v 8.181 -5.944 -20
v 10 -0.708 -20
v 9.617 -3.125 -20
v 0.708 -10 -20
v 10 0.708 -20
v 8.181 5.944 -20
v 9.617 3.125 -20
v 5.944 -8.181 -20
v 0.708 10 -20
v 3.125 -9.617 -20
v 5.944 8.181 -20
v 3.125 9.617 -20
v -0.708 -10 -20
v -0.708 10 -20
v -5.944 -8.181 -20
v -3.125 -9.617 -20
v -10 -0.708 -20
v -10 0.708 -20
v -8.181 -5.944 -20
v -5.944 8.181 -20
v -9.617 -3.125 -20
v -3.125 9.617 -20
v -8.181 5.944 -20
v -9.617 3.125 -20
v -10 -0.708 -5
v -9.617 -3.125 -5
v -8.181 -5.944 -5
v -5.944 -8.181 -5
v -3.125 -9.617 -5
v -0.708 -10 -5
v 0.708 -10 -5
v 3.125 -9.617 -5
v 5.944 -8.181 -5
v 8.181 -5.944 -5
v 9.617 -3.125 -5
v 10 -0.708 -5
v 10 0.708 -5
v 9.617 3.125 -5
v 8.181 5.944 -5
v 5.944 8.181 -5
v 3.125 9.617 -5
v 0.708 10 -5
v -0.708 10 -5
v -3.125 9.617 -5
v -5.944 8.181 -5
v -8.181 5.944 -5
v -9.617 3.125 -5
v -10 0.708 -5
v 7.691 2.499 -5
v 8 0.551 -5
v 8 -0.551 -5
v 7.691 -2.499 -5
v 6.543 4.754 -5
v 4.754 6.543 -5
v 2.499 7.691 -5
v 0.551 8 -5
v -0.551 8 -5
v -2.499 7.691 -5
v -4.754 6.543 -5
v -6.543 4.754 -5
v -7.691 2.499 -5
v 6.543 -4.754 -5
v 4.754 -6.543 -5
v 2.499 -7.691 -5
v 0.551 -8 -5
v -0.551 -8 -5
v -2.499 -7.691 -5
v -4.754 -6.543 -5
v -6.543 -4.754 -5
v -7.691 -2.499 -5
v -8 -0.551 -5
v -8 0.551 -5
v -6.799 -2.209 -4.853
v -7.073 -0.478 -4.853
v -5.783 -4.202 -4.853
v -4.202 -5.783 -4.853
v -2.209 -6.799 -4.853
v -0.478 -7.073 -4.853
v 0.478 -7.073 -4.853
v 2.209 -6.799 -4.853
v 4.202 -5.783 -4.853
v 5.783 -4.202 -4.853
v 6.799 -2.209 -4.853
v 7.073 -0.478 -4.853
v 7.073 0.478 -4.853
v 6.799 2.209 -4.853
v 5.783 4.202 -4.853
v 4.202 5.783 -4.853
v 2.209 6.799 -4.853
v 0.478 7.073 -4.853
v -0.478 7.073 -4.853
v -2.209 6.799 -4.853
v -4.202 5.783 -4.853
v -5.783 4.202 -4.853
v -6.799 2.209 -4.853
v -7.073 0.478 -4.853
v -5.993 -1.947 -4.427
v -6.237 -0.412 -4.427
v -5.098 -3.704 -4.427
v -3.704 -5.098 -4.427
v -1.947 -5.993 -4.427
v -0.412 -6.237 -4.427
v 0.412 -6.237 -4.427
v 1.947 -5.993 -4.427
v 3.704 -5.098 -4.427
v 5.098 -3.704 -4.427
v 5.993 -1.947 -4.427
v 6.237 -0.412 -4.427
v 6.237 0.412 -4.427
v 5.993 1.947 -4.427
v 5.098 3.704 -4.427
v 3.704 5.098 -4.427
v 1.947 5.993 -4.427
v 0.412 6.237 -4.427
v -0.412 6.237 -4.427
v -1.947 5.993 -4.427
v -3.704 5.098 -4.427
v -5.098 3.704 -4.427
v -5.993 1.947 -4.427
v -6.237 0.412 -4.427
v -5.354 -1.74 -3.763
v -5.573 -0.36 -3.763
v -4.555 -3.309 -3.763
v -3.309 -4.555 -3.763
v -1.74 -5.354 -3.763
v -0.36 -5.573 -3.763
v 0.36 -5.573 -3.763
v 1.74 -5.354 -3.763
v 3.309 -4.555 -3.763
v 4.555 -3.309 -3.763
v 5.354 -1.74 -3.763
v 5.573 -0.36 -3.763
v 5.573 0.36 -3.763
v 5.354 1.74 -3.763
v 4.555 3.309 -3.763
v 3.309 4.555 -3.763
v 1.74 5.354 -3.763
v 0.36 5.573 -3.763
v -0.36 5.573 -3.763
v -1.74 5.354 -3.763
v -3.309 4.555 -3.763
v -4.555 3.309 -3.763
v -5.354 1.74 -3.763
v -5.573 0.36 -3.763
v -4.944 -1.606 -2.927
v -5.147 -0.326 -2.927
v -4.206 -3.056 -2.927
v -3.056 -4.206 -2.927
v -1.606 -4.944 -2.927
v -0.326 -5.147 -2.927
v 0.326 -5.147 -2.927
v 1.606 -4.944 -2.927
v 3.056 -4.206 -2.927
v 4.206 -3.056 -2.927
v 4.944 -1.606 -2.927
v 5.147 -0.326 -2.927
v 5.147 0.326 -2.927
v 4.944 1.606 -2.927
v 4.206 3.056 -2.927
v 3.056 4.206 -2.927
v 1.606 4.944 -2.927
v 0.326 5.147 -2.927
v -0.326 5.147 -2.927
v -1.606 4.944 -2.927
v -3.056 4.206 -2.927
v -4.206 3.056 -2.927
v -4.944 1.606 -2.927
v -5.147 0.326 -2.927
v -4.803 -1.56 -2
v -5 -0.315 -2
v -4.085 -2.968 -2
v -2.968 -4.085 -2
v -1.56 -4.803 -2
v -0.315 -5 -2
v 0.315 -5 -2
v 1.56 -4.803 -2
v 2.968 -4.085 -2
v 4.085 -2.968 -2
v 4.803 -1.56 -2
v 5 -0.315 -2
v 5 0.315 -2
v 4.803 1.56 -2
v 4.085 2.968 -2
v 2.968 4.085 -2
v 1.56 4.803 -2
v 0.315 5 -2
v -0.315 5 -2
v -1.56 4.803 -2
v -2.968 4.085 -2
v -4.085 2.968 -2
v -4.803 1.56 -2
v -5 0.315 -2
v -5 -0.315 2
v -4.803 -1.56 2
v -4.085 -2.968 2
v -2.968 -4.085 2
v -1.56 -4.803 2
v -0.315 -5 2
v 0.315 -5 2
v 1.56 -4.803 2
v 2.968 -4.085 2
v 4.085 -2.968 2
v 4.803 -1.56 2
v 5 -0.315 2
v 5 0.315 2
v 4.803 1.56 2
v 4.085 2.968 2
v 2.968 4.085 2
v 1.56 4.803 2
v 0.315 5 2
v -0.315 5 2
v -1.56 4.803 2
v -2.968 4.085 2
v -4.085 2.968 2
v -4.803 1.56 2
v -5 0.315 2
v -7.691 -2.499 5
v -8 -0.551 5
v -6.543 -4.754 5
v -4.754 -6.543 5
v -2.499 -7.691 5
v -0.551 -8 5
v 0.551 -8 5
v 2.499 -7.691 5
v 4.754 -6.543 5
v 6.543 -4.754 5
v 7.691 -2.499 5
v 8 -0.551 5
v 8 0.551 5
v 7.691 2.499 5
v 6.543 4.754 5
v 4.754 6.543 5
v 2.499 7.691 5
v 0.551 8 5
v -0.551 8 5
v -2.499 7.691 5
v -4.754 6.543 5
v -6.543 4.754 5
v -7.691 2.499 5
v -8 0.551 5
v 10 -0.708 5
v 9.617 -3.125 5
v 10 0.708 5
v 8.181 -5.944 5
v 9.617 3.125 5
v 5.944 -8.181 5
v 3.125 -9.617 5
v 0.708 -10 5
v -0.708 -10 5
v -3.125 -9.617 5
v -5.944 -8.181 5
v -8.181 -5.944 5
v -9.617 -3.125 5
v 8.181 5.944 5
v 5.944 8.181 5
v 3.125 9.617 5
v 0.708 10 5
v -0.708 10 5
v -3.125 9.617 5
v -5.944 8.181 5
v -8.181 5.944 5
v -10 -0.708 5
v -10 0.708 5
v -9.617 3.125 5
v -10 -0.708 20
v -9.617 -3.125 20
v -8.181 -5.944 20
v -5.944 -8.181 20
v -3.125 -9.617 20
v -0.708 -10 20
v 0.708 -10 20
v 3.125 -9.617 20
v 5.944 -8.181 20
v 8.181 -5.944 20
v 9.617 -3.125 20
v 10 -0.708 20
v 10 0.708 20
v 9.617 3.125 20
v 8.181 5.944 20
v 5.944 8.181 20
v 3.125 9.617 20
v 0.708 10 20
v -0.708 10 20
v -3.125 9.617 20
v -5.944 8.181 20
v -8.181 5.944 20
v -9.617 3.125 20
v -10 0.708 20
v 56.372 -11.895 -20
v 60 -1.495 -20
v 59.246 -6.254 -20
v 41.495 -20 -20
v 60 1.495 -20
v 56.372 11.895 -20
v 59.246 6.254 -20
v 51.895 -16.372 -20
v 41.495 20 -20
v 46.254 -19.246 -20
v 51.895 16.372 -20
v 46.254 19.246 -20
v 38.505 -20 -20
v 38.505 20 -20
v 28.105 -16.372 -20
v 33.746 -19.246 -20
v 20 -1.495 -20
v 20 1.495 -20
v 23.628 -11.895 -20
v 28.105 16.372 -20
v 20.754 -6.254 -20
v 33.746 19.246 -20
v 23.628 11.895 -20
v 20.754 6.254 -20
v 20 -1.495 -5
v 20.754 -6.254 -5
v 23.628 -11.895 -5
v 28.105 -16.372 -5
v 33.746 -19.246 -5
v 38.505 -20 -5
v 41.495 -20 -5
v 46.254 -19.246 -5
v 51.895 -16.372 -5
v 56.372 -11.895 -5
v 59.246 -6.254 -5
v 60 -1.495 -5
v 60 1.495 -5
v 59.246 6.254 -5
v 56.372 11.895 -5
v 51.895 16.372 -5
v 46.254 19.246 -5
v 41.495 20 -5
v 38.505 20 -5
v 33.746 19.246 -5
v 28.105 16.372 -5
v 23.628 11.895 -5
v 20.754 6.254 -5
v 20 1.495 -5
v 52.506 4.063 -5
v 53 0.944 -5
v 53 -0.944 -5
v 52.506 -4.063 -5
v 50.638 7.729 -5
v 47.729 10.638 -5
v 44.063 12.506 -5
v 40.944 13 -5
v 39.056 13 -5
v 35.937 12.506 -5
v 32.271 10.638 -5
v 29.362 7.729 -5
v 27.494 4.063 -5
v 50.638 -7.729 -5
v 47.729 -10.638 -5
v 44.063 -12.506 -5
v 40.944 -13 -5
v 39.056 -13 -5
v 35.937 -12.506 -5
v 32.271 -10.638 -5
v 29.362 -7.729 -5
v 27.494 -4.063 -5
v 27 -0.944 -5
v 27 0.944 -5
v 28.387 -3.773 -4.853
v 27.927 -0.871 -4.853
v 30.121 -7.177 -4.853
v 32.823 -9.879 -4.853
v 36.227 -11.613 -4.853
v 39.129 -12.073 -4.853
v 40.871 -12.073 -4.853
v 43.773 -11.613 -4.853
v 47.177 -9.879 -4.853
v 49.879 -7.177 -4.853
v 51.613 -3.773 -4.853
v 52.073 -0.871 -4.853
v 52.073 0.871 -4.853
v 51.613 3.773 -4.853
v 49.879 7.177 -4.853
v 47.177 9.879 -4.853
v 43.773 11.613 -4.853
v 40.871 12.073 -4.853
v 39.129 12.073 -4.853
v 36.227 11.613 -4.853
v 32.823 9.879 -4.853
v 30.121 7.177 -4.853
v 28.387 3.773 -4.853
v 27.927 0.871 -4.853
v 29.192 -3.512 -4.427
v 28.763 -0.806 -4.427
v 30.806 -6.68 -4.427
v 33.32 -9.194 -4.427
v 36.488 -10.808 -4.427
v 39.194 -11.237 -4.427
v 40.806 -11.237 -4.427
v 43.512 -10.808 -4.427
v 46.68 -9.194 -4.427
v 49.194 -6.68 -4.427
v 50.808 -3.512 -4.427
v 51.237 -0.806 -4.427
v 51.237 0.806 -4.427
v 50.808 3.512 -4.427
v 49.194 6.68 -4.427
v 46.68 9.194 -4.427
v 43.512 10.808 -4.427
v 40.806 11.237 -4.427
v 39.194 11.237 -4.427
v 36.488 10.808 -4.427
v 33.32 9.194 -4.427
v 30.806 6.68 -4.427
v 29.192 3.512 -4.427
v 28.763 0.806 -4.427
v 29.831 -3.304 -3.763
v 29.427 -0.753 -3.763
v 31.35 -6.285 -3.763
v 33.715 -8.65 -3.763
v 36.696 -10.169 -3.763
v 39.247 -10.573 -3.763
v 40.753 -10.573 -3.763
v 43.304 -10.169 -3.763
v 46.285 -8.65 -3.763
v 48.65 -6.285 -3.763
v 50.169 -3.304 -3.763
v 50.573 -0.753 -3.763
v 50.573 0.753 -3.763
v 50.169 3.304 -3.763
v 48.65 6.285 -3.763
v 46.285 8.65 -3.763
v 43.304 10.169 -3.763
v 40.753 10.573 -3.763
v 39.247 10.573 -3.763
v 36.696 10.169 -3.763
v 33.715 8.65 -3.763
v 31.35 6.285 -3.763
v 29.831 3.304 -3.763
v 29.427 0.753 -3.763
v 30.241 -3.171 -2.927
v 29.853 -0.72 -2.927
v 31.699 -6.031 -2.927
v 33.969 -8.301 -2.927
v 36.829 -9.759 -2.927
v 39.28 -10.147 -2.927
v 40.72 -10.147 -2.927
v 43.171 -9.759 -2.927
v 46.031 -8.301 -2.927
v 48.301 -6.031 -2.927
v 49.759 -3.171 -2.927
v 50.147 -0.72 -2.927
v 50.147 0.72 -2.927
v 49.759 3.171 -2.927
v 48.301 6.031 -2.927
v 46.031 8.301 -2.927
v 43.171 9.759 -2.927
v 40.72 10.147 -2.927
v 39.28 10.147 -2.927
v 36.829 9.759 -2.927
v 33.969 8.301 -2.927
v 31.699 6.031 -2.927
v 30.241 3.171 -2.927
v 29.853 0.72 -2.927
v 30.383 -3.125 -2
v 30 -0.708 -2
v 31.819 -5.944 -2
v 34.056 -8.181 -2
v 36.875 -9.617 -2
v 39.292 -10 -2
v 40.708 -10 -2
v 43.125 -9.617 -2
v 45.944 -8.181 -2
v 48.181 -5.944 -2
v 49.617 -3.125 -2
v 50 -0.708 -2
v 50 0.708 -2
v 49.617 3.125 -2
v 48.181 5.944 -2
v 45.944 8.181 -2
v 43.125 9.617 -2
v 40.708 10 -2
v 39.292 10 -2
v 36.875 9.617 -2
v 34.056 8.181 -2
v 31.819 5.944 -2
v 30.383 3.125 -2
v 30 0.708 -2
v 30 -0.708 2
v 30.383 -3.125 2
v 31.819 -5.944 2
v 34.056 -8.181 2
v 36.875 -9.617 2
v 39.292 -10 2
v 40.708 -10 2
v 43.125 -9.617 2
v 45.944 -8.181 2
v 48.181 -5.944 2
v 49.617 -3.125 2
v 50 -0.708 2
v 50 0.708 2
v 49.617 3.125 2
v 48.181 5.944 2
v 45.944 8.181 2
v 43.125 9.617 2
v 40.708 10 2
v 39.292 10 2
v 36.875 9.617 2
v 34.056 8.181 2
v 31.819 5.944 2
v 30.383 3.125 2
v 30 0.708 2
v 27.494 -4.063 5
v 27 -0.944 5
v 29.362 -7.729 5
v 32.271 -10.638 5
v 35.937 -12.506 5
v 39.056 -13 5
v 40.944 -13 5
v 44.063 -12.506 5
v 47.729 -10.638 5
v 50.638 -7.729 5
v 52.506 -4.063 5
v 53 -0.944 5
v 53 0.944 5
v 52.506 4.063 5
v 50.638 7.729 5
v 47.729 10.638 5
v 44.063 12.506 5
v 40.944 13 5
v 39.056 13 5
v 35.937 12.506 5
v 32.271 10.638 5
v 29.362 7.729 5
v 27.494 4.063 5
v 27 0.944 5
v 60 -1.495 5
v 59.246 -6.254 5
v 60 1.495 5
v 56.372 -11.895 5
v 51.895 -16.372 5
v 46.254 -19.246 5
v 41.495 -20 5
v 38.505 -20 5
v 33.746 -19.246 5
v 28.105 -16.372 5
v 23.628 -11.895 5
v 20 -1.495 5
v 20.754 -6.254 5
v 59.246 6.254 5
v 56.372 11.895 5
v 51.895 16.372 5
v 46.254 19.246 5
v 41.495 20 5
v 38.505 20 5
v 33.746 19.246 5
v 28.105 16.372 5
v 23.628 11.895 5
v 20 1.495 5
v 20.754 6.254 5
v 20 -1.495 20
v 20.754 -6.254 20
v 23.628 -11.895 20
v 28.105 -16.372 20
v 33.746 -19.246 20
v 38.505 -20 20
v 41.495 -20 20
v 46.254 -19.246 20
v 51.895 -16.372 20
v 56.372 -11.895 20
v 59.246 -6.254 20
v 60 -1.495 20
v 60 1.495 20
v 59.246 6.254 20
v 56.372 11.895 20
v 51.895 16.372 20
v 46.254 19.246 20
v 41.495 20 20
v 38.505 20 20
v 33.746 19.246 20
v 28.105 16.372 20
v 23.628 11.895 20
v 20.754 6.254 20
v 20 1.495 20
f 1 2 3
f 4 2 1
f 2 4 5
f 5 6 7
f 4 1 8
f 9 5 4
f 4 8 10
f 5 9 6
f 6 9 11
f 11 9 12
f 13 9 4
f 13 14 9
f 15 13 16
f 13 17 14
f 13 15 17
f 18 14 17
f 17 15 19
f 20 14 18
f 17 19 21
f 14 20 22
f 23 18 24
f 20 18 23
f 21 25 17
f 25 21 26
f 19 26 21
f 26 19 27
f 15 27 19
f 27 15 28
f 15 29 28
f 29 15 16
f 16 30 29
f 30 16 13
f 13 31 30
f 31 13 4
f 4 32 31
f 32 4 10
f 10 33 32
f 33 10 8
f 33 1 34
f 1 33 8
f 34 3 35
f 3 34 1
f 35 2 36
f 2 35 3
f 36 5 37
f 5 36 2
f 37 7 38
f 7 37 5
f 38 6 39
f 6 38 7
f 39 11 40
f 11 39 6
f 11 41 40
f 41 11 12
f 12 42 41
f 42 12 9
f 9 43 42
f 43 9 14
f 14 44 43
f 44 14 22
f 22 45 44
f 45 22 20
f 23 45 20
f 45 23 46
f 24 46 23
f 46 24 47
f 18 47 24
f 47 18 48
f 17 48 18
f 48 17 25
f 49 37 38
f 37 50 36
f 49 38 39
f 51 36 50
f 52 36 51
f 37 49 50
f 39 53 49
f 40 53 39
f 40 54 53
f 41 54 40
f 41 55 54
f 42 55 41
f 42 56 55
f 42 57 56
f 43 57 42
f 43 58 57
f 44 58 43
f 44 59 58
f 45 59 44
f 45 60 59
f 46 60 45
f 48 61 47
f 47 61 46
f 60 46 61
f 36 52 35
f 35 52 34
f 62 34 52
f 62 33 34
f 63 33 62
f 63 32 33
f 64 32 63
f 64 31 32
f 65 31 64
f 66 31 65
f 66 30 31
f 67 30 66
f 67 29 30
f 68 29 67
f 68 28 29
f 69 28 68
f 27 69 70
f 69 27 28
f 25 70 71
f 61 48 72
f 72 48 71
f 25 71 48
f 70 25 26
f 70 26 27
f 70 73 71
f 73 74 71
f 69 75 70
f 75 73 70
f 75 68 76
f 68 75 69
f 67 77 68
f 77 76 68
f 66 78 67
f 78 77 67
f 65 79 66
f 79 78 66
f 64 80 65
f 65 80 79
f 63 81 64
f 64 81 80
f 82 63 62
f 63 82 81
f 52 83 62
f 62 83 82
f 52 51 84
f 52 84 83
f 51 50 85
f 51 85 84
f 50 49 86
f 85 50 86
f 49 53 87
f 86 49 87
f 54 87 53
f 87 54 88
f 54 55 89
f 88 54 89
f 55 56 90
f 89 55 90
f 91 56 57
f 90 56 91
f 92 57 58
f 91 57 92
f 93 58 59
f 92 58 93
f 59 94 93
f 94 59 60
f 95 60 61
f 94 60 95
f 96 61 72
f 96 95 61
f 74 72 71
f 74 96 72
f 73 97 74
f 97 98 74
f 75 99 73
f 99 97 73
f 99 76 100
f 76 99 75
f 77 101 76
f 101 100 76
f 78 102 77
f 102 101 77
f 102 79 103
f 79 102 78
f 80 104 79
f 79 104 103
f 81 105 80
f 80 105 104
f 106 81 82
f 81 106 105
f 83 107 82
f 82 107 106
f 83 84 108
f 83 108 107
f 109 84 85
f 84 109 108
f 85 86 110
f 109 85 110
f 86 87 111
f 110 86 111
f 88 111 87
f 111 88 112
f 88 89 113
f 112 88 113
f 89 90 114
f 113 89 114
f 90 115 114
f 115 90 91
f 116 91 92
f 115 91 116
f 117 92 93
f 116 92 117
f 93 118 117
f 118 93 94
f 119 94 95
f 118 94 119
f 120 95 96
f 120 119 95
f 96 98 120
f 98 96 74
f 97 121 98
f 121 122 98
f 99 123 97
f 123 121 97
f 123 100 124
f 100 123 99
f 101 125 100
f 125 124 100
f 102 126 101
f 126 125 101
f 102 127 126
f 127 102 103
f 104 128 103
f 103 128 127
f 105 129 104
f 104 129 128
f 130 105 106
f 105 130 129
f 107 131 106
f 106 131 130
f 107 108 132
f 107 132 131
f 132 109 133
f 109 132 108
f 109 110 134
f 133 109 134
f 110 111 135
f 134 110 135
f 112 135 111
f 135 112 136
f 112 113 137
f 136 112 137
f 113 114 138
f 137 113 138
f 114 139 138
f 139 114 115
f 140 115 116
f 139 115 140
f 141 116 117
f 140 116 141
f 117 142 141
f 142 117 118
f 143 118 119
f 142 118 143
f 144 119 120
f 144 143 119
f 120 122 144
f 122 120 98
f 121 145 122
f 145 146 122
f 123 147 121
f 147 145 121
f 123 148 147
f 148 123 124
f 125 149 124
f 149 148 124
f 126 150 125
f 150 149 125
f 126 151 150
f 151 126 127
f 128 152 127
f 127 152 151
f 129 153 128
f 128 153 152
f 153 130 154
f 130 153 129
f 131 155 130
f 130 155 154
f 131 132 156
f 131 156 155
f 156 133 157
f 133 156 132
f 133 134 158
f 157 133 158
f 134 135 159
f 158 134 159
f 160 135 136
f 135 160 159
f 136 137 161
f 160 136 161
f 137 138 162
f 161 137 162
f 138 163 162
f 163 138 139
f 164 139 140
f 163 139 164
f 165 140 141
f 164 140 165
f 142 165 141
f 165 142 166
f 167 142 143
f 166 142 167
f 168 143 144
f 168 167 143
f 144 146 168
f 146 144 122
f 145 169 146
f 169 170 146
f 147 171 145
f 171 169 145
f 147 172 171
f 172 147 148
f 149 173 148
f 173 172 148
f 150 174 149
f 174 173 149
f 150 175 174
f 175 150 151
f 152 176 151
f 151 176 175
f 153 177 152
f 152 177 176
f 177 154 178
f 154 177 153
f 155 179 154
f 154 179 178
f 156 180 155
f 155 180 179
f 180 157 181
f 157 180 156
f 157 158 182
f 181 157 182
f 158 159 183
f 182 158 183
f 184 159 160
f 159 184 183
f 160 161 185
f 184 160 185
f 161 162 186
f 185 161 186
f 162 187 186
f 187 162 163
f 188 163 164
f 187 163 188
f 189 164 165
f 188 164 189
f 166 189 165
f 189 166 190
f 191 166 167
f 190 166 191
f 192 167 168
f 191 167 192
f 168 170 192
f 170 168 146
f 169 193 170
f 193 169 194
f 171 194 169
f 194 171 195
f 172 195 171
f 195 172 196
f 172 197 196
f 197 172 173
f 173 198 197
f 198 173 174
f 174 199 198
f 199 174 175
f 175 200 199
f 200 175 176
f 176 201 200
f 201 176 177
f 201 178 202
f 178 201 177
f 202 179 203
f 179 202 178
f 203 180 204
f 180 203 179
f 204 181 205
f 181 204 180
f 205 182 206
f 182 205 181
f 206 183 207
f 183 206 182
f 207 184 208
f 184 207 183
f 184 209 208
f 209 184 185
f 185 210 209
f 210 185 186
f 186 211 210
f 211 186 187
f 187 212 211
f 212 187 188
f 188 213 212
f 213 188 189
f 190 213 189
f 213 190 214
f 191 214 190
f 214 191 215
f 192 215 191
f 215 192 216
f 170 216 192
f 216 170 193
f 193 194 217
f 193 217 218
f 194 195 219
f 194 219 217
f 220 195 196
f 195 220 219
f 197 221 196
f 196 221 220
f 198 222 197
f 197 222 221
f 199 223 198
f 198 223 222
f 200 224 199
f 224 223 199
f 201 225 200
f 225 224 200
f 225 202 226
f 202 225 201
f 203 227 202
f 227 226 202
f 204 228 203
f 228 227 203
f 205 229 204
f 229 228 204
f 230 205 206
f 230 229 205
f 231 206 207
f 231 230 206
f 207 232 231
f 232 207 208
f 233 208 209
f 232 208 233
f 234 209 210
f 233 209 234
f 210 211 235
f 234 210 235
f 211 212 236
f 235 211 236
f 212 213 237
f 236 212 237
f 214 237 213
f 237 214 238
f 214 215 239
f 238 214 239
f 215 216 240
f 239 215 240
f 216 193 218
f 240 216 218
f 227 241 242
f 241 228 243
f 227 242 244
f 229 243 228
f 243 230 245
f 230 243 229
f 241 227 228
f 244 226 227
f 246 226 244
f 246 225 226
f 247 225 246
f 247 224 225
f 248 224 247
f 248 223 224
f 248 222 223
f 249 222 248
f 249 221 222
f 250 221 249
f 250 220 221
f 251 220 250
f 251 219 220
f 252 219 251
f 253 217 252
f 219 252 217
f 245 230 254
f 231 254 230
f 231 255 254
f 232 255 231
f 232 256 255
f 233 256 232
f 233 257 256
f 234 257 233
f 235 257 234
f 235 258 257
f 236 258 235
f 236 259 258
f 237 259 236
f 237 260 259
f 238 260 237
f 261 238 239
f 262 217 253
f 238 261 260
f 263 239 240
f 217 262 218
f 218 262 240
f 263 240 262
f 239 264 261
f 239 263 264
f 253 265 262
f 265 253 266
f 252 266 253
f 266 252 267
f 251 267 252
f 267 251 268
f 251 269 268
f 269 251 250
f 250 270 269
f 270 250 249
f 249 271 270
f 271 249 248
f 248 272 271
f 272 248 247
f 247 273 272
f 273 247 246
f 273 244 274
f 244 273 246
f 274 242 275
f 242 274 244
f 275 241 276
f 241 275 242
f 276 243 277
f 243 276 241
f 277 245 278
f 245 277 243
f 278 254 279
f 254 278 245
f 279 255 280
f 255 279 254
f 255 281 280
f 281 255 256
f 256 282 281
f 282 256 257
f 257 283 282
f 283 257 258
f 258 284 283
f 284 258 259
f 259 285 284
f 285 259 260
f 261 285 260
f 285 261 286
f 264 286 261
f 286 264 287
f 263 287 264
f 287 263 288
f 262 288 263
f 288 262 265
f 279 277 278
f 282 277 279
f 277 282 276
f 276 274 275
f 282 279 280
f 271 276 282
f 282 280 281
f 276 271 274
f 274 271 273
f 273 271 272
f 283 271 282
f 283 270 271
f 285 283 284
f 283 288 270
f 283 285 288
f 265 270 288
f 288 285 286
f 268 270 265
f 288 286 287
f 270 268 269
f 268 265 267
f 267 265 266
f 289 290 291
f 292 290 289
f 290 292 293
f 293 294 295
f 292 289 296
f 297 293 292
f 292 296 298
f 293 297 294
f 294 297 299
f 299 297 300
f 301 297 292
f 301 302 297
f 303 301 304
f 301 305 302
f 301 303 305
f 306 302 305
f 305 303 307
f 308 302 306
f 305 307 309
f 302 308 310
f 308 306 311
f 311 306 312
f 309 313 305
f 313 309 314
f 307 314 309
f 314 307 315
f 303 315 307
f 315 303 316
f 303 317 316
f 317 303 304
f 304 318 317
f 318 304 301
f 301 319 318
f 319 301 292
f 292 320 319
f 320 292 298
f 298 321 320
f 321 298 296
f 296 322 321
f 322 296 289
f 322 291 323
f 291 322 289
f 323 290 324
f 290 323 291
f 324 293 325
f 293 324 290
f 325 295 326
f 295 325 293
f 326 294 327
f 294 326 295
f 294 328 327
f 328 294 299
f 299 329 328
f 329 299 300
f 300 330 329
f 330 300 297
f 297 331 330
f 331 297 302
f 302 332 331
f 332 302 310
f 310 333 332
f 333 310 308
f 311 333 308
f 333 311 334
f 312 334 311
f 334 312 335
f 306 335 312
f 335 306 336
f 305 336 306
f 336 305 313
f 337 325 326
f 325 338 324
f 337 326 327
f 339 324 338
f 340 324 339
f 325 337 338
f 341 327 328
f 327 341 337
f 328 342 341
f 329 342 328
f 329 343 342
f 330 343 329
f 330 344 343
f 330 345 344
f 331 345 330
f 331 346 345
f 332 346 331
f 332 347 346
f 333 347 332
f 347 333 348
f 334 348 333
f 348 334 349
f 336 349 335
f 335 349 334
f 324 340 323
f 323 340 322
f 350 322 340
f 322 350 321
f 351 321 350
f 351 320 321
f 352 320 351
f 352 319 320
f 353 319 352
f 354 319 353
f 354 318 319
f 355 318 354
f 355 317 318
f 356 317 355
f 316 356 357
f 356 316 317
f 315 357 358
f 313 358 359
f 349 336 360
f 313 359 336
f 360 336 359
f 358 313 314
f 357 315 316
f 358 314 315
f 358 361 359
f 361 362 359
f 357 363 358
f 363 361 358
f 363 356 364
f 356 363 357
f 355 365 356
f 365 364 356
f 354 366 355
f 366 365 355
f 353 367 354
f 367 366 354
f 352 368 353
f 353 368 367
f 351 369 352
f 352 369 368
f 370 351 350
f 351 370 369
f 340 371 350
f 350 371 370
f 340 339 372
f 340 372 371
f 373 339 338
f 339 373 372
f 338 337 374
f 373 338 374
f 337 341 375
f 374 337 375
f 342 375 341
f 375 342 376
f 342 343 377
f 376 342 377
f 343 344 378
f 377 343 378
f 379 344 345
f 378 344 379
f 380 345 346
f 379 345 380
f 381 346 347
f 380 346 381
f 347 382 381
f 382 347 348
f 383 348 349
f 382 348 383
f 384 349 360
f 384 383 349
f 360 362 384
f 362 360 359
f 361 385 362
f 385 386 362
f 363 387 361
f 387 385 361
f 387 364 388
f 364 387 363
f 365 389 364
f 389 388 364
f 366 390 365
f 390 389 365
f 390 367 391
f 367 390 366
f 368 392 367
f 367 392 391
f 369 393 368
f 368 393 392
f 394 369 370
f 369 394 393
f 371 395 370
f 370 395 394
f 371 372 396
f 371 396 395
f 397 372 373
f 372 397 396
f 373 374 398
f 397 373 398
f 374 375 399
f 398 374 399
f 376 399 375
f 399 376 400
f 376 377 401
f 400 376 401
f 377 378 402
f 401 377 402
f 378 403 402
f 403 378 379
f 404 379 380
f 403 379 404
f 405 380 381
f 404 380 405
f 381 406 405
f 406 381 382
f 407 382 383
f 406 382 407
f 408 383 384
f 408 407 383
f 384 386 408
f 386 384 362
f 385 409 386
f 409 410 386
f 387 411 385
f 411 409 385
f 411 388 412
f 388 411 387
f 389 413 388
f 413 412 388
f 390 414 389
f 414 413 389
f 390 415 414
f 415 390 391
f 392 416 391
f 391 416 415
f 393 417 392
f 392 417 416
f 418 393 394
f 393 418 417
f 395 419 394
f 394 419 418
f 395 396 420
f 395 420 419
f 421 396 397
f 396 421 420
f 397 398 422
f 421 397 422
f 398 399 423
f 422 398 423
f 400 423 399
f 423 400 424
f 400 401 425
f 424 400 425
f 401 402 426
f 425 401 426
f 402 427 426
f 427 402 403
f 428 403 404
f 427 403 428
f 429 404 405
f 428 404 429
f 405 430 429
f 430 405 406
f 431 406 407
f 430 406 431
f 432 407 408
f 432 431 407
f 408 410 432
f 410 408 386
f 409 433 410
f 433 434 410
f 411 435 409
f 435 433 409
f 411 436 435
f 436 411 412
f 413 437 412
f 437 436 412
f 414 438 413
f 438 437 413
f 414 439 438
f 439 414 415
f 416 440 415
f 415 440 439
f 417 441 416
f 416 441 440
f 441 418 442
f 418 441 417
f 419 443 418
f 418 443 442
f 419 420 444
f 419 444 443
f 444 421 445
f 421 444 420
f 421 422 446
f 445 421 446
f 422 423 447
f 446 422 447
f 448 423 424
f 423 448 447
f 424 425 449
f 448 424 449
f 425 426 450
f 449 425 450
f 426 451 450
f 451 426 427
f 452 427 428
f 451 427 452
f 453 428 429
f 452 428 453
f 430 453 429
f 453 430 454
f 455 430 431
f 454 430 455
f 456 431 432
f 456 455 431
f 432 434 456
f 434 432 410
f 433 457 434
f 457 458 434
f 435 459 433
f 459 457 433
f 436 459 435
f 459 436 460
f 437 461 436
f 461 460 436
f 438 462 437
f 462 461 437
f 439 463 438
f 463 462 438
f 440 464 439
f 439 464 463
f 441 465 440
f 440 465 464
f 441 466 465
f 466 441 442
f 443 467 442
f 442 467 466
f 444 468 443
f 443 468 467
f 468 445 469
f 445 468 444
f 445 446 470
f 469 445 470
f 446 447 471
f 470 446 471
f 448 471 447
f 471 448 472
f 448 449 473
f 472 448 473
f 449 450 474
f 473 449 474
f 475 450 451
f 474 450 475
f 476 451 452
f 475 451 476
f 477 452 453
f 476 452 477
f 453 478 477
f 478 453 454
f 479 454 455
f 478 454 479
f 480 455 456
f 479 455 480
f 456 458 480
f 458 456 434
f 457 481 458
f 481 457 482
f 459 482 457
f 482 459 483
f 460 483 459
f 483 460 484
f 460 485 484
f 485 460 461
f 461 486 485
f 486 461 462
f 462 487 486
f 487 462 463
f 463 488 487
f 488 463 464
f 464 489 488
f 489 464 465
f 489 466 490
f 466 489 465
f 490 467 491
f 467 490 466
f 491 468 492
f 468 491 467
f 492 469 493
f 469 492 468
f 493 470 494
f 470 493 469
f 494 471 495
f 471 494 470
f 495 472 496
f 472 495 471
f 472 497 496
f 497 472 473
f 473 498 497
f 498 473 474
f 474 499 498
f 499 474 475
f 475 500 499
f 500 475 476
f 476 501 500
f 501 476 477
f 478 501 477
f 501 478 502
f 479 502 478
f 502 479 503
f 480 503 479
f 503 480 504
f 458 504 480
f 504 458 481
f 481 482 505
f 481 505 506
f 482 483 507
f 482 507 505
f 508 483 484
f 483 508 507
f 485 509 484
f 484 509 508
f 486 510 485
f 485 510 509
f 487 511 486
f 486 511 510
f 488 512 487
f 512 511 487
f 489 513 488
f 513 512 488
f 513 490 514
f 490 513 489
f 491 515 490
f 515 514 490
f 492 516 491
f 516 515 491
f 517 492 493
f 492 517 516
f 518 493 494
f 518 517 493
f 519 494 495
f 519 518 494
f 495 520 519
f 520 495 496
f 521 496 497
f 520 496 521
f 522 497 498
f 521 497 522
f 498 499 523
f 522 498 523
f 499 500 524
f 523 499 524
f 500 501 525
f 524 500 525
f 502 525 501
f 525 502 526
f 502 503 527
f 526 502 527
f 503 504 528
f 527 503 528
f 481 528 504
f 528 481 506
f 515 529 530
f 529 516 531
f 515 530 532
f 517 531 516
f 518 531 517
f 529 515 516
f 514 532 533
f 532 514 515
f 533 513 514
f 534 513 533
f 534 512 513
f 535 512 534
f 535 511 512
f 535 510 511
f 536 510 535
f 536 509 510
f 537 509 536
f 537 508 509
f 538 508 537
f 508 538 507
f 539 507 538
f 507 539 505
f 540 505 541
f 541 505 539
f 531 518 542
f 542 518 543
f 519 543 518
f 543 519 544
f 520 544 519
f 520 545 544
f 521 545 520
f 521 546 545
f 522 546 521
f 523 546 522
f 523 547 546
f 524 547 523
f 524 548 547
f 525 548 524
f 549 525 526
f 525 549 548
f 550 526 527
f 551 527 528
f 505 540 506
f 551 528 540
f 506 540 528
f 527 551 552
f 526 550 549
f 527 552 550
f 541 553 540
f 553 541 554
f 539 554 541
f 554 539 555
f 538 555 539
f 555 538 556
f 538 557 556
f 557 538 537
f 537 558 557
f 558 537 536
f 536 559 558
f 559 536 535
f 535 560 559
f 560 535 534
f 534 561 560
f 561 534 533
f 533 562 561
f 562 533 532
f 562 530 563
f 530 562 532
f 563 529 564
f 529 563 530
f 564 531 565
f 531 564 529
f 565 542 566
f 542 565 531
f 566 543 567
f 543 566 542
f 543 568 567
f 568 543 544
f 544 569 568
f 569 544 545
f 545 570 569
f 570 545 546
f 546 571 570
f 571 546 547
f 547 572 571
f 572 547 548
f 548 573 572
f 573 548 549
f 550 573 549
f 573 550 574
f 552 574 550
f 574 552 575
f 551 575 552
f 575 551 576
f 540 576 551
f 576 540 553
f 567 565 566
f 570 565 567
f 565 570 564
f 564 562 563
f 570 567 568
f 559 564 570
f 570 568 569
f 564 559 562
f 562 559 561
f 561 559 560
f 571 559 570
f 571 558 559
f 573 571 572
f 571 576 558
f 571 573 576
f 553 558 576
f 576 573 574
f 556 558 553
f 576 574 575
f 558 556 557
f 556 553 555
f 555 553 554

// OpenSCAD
// file: ../lib/TOGComplexLib1.scad
function tcplx1_multiply(a, b) =
	[a[0]*b[0] - a[1]*b[1], a[0]*b[1] + a[1]*b[0]];
function tcplx1_divide(a, b) =
	let(bot = (b[0]*b[0] + b[1]*b[1]))
	[
		(a[0]*b[0] + a[1]*b[1])/bot,
		(a[1]*b[0] - a[0]*b[1])/bot
	];

assert([-11,23] == tcplx1_multiply([3,2], [1,7]));

assert([-1,3] == tcplx1_multiply([3,1], [0,1]));
assert([-1,3] == tcplx1_multiply([0,1], [3,1]));

echo(tcplx1_divide([-1,3], [3,1]));
assert([0,1] == tcplx1_divide([-1,3], [3,1]));

function tcplx1_normalize(vec) =
	let(veclen = sqrt(vec[0]*vec[0]+vec[1]*vec[1]))
	[vec[0] / veclen, vec[1] / veclen];

function tcplx1_relative_turnvec_vv(v0, v1) =
	tcplx1_divide(tcplx1_normalize(v1), tcplx1_normalize(v0));

function tcplx1_relative_turnvec_abc(p0, p1, p2) = tcplx1_relative_turnvec_vv(p1-p0, p2-p1);

// A 90-degree turn
assert([0,1] == tcplx1_relative_turnvec_abc([0,0], [1,0], [1,1]));
assert([0,1] == tcplx1_relative_turnvec_abc([0,0], [0,1], [-1,1]));

// A 45-degree turn
assert(tcplx1_normalize([1,1]) == tcplx1_relative_turnvec_abc([0,0], [1,0], [ 2,1]));
assert(tcplx1_normalize([1,1]) == tcplx1_relative_turnvec_abc([0,0], [0,1], [-1,2]));


function tcplx1_relative_angle_abc(p0, p1, p2) =
	let(turnvec = tcplx1_relative_turnvec_abc(p0, p1, p2))
	atan2(turnvec[1], turnvec[0]);

assert(-135 == tcplx1_relative_angle_abc([0,0], [1,0], [0,-1]));
assert( -90 == tcplx1_relative_angle_abc([0,0], [1,0], [1,-1]));
assert(   0 == tcplx1_relative_angle_abc([0,0], [1,0], [2, 0]));
assert(  90 == tcplx1_relative_angle_abc([0,0], [1,0], [1, 1]));
assert( 135 == tcplx1_relative_angle_abc([0,0], [1,0], [0, 1]));

assert(  90 == tcplx1_relative_angle_abc([1,1], [3,3], [1, 5]));
// file: ../lib/TOGArrayLib1.scad
// TOGArrayLib1.5
// 
// Functions for working with arrays.
// 
// v1.1:
// - tal1_reduce assert(is_list(items)) to prevent infinite recursion
//   when given undefined or other non-list values
// v1.1.1:
// - Fix tal1_uniq_remap_v2 to return "list-remap-result" as the
//   first element of the returned list
// v1.2:
// - Add tal1_replace_at function
// v1.3:
// - tal1_is_vec_of, tal1_is_vec_of_num
// v1.4:
// - tal1_assert_for_each, for when you want to assert something
//   about each of a list of items and get nice failure messages
// v1.5:
// - Add tal1_duplicate_reversed function, which may be
//   handy when generating symmetrical polygons and stuff.

/**
 * Make a list with the contents of list `a`,
 * but starting at offset `off`, replaced by the contents of list `b`.
 * len(result) = max(len(a), off+len(b))
 */
function tal1_replace_at(a, off, b, default_value=undef, default_value_function=undef) =
	assert(is_list(a))
	assert(is_list(b))
	let( _dvf = !is_undef(default_value_function) ? default_value_function : function(i) default_value )
[
	for( i=[0:1:min(off,len(a))-1] ) a[i],
	for( i=[len(a):1:off-1] ) _dvf(i),
	for( i=[off:1:off+len(b)-1] ) b[i-off],
	for( i=[off+len(b):1:len(a)-1] ) a[i],
];

// Simplest case
assert([] == tal1_replace_at([], 0, []));
// Second simplest cases
assert(["foo"] == tal1_replace_at(["foo"], 0, []));
assert(["foo"] == tal1_replace_at([], 0, ["foo"]));
// Replace one item
assert(["foo","quux","baz"] == tal1_replace_at(["foo","bar","baz"], 1, ["quux"]));
// Replace and extend
assert(["foo","quux","tuna","tina"] == tal1_replace_at(["foo","bar","baz"], 1, ["quux", "tuna", "tina"]));
// Add beyond end of `a`
assert(["foo","zzz","quux"] == tal1_replace_at(["foo"], 2, ["quux"], default_value="zzz"));
// Adding 'nothing' should still fill to that point with defaults
assert(["foo","zzz","zzz"] == tal1_replace_at(["foo"], 3, [], default_value="zzz"));


function tal1_reduce(start, items, func, offset=0) =
	assert(is_list(items))
	len(items) == offset ? start :
	tal1_reduce(func(start, items[offset]), items, func, offset+1);

function tal1_consecutive_duplicate_count(items) = tal1_reduce(
	[0, undef],
	items,
	function(z,item) [z[0] + (item == z[1] ? 1 : 0), item]
)[0];

assert(0 == tal1_consecutive_duplicate_count([]));
assert(0 == tal1_consecutive_duplicate_count([50]));
assert(1 == tal1_consecutive_duplicate_count([50,50]));
assert(0 == tal1_consecutive_duplicate_count([50,51,52,53]));
assert(1 == tal1_consecutive_duplicate_count([50,51,52,52]));
assert(3 == tal1_consecutive_duplicate_count([50,50,50,50]));

// Set test_size to arbirarily large values
// to ensure that OpenSCAD can handle heavy recursion
let(test_size=1000) assert(test_size/2 == tal1_consecutive_duplicate_count([for(i=[0:1:test_size-1]) floor(i/2)]));



function tal1_uniq_(items, off0, off1) =
	let(chunklen = off1-off0)
	chunklen == 0 ? [] :
	chunklen == 1 ? [items[off0]] :
	let(half=floor(chunklen/2))
	let(left  = tal1_uniq_(items, off0     , off0+half))
	let(right = tal1_uniq_(items, off0+half, off1     ))
	assert(len(left) > 0)
	assert(len(right) > 0)
	left[len(left)-1] == right[0] ? [each left, for(i=[1:1:len(right)-1]) right[i]] :
	[each left, each right];

/** Given a list of items, returns a new list with identical consecutive items merged */
function tal1_uniq(items) = tal1_uniq_(items, 0, len(items));

assert([] == tal1_uniq([]));
assert([123] == tal1_uniq([123]));
assert([55,0,1,2,3] == tal1_uniq([55,0,1,2,3]));
assert([55,0,1,2] == tal1_uniq([55,0,1,1,2]));
assert([55,0,1] == tal1_uniq([55,55,0,0,0,0,0,0,1,1,1,1]));
assert([55,0] == tal1_uniq([55,0,0,0,0,0,0,0]));



/**
 * Returns [new items, old index -> new index mapping].
 * No-op version.
 */
function tal1_uniq_remap_v1(items) =
	["list-remap-result", items, [for (vi=[0:1:len(items)-1]) vi]];

// [a, a, b, b, c, c]
//
// [a,    ...], []  -> [a],[0]
// [a, a, ...], [0] -> [a],[0,0]

assert([1,2,3] == [1,2,3]);

/**
 * Recursive version that will combine adjacent identical vertexes,
 * but will use the original items.
 */
function tal1_uniq_remap_v2(items, map=[]) =
	let(index = len(map))
	len(items) == index ? ["list-remap-result", items, map] :
	index == 0 ? tal1_uniq_remap_v2(items, [0]) :
	items[index] == items[map[index-1]] ? tal1_uniq_remap_v2(items, [for(vi=map) vi, map[index-1]]) :
	tal1_uniq_remap_v2(items, [for(vi=map) vi, index]);

assert(tal1_uniq_remap_v2([1,1,2,2,3,4]) == ["list-remap-result", [1,1,2,2,3,4], [0,0,2,2,4,5]]);


/**
 * Returns true if `vec` is a list of at least min_len items
 * and component_check(each item, even those beyond min_len) is true.
 */
function tal1_is_vec_of(vec, min_len=0, component_check=function(x) true) =
	assert(is_num(min_len) && min_len >= 0)
	assert(is_function(component_check))
	is_list(vec) && len(vec) >= min_len &&
	tal1_reduce(true, vec, function(prev,item) prev && component_check(item));

function tal1_is_vec_of_num(vec, min_len=0) = tal1_is_vec_of(vec, min_len, function(i) is_num(i));

assert( true == tal1_is_vec_of_num([1,2,3]));
assert( true == tal1_is_vec_of_num([]));
assert( true == tal1_is_vec_of_num([1,2,3], 3));
assert(false == tal1_is_vec_of_num([1,2], 3));
assert(false == tal1_is_vec_of_num([1,2,"spoon"], 3));
// Requirements are ambiguous when
// first min_len items are numbers, but there are non-numeric items afterwards,
// so let's error on the side of saying 'no, it's not a list of numbers';
// i.e. the item check and the min_len are independent.
assert(false == tal1_is_vec_of_num([1,2,3,"artichoke"], 3));


/**
 * Asserts that item_checker(each item in list, index of item)[0] is true.
 * Second element of item_checker return value is assertion message.
 * Returns the original list, in case that's useful to you.
 */
function tal1_assert_for_each(list, item_checker) =
	let( _ignored = [ for(i=[0:1:len(list)-1])
		let(q=item_checker(list[i],i))
		let(passed=is_bool(q) ? q : is_list(q) ? q[0] : assert(false, str(
			"tal1_assert_for_each: item_checker should return Bool|[Bool,String], but returned ",
			q, " for item at index ", i)))
		let(message=is_list(q) ? q[1] : undef)
		assert(passed, message)
		q
	])
	list;

// Callback can return a boolean...
assert([1,2,3] == tal1_assert_for_each([1,2,3], function(v,i) is_num(v)));
// ...or a [boolean, string]
assert([1,2,3] == tal1_assert_for_each([1,2,3], function(v,i) [is_num(v), "element be a num"]));

// [a, b, c] -> [a, b, c, rxf(c), rxf(b), rxf(a)]
function tal1_duplicate_reversed(list, rxf=function(item) item) =
	[
		each list,
		for( i=[len(list)-1 : -1 : 0] ) rxf(list[i]),
	];
// file: ../lib/TOGVecLib0.scad
// Note: TOGMod1Constructors's togmod1__make_nd_vector_adder is used for similar purpose.

function togvec0_extend(vec, length, filler=0) = [
	for( i=[0 : 1 : length-1] ) len(vec) <= i ? filler : vec[i]
];

function togvec0_add_vec(a, b) =
	let( newlen = max(len(a), len(b)) )
	togvec0_extend(a, newlen) + togvec0_extend(b, newlen);

function togvec0_offset_points(points, offset, numtovec=function(n) [0,0,n] ) =
	let( offset_vec =
		is_list(offset) ? offset :
		is_num(offset) ? numtovec(offset) :
		assert(false, str("togvec0_offset_points: `offset` must be a List<Number> or Number; got: ", offset)) )
	[for(p=points) togvec0_add_vec(p, offset_vec)];
// file: ../lib/TOGMod1Constructors.scad
// TOGMod1Constructors-v1.11
// 
// Functions to construct objects understood by TOGMod1
// 
// v1.1:
// - Add togmod1_make_rounded_rect
// v1.2:
// - togmod1_make_rounded_rect can make ovals
// v1.3:
// - togmod1_circle_points, to just get the points of a circle
// - if pos parameter to circle function has a third element,
//   returned vertexes will include it as the z component;
// v1.3.1
// - Some assertions
// v1.4:
// - Refactor togmod1_rounded_rect_points and togmod1_circle_points
//   to use togmod1__make_nd_vector_adder for adapting to whatever
//   `pos` parameter is.
// v1.5:
// - togmod_rounded_rect_points will not simplify completely rounded sides
//   (where length of side is exactly twice the rounding radius)
//   unless simplify_rounded_sides=true
//   - This makes it more useful for polyhedron generation,
//     where radius varies, but number of points must remain constant.
// v1.6:
// - togmod1_make_rect makes a simple rectangle
// - togmod1_make_rounded_rect will defer to togmod1_make_rect when r=0
// v1.7:
// - togmod1_make_circle will return empty shape (["union"]) when d=0
// v1.8:
// - Add togmod1_text
// v1.9:
// - togmod1_circle_points uses 3 as minimum circle point count instead of 6
// v1.10:
// - Fix togmod1_linear_extrude_y so that range corresponds to Y start/end and
//   polygon X,Y correspond to X,Z.  Previously it was rotated wrongly,
//   which would have gone unnoticed for symmetrical shapes centered at 0,0.
// v1.11:
// - Remove an 'echo'

use <./TOGArrayLib1.scad>

function togmod1__make_nd_vector_adder(origin=[0,0]) =
	let(origin_is_zero = tal1_reduce(true, origin, function(prev,item) prev && item == 0))
	origin_is_zero ? (function(vec) len(vec) >= len(origin) ? vec : tal1_replace_at(origin, 0, vec)) :
	function(vec) [
		for(i=[0:1:max(len(origin),len(vec))-1]) (len(vec) > i ? vec[i] : 0) + (len(origin) > i ? origin[i] : 0),
	];

assert([1,2,3] == togmod1__make_nd_vector_adder()([1,2,3]));
assert([1,2,3] == togmod1__make_nd_vector_adder([0,0,3])([1,2]));


function togmod1_make_cuboid(size) =
	assert(is_list(size))
	assert(len(size) >= 3)
	assert(is_num(size[0]))
	assert(is_num(size[1]))
	assert(is_num(size[2]))
	["polyhedron-vf", [
		[-size[0]/2, -size[1]/2, -size[2]/2],
		[+size[0]/2, -size[1]/2, -size[2]/2],
		[-size[0]/2, +size[1]/2, -size[2]/2],
		[+size[0]/2, +size[1]/2, -size[2]/2],
		[-size[0]/2, -size[1]/2, +size[2]/2],
		[+size[0]/2, -size[1]/2, +size[2]/2],
		[-size[0]/2, +size[1]/2, +size[2]/2],
		[+size[0]/2, +size[1]/2, +size[2]/2]
	], [
		[0,1,3,2],[0,4,5,1],[4,6,7,5],[3,7,6,2],[1,5,7,3],[6,4,0,2]
	]];

function togmod1_make_polygon(verts) =
	["polygon-vp", verts, [[for( i=[0:1:len(verts)-1] ) i%len(verts)]]];

function togmod1_rounded_rect_points(size, r, pos=[0,0], simplify_rounded_sides=false) =
	assert(is_list(size))
	assert(len(size) >= 2)
	let(radii = is_list(r) ? r : is_num(r) ? [r,r] : assert(false, "rounded_rect r(adius) should be list<num> or num"))
	let(rx = radii[0])
	let(ry = radii[1])
	assert(is_num(rx))
	assert(is_num(ry))
	assert(size[0] >= 2*rx, str("size[0] must be >= 2*r[0]; size[0] = ",size[0],", 2*r[0] = ",2*rx))
	assert(size[1] >= 2*ry, str("size[1] must be >= 2*r[1]; size[1] = ",size[1],", 2*r[1] = ",2*ry))
	let(quarterfn=max($fn/4, 1))
	let(qfnx = simplify_rounded_sides && size[0] == 2*rx ? quarterfn-1 : quarterfn)
	let(qfny = simplify_rounded_sides && size[1] == 2*ry ? quarterfn-1 : quarterfn)
	let(finalizepos = togmod1__make_nd_vector_adder(pos))
[
	for(a=[0 : 1 : qfnx]) let(ang=      a*90/quarterfn) finalizepos([ size[0]/2-rx + rx*cos(ang),  size[1]/2-ry + ry*sin(ang)]),
	for(a=[0 : 1 : qfny]) let(ang= 90 + a*90/quarterfn) finalizepos([-size[0]/2+rx + rx*cos(ang),  size[1]/2-ry + ry*sin(ang)]),
	for(a=[0 : 1 : qfnx]) let(ang=180 + a*90/quarterfn) finalizepos([-size[0]/2+rx + rx*cos(ang), -size[1]/2+ry + ry*sin(ang)]),
	for(a=[0 : 1 : qfny]) let(ang=270 + a*90/quarterfn) finalizepos([ size[0]/2-rx + rx*cos(ang), -size[1]/2+ry + ry*sin(ang)]),
];

function togmod1_make_rect(size) =
	togmod1_make_polygon([
		[-size[0]/2, -size[1]/2],
		[+size[0]/2, -size[1]/2],
		[+size[0]/2, +size[1]/2],
		[-size[0]/2, +size[1]/2],
	]);

function togmod1_make_rounded_rect(size, r) =
	r == 0 ? togmod1_make_rect(size) :
	togmod1_make_polygon(togmod1_rounded_rect_points(size,r,simplify_rounded_sides=true));

/**
 * Returns points for an approximation of a circle where points are at distance r from pos.
 * Can be used to make other regular polygons, but the faces will be less than that
 * distance from pos (do some trig if you want face distance, e.g. for a hex nut).
 */
function togmod1_circle_points(r, pos=[0,0], d=undef) =
	assert( !is_undef(r) || !is_undef(d) )
	assert(!is_undef(pos[0]))
	assert(!is_undef(pos[1]))
	let(finalizepos = togmod1__make_nd_vector_adder(pos))
	let(r_ = !is_undef(r) ? r : d/2)
	let(fn = max($fn, 3))
	[for(i=[0 : 1 : fn-1]) finalizepos([r_*cos(i*360/fn), r_*sin(i*360/fn)])];

function togmod1_make_circle(r, pos=[0,0], d=undef) =
	r == 0 || d == 0 ? ["union"] :
	togmod1_make_polygon(togmod1_circle_points(r=r, pos=pos, d=d));

function togmod1_make_cylinder(d, zrange=[0,1], r=undef, pos=[0,0]) =
	assert( !is_undef(r) || !is_undef(d) )
	let( r_ = !is_undef(r) ? r : d/2 )
	// TODO: Make polyhedron directly
	["linear-extrude-zs", zrange, togmod1_make_circle(r=r_, pos=pos)];

function togmod1__is_range1d(range) = is_list(range) && len(range) == 2 && is_num(range[0]) && is_num(range[1]);

function togmod1_linear_extrude_z(range, shape) =
	assert(togmod1__is_range1d(range))
	["linear-extrude-zs", range, shape];
function togmod1_linear_extrude_x(range, shape) =
	assert(togmod1__is_range1d(range))
	["rotate", [90, 0, 90], togmod1_linear_extrude_z(range, shape)];
function togmod1_linear_extrude_y(range, shape) =
	assert(togmod1__is_range1d(range))
	["rotate", [90, 0,  0], togmod1_linear_extrude_z([-range[1], -range[0]], shape)];

function togmod1_text(text, size, font, halign, valign, spacing, direction, language, script) =
	["text-tsfhvsdls", text, size, font, halign, valign, spacing, direction, language, script];
// file: ../lib/TOGMod1.scad
// TOGMod1.9
// OpenSCAD library for representing shapes
// 
// See also: Functional OpenSCAD (https://github.com/thehans/FunctionalOpenSCAD)
// 
// v1.8:
// - Add `text-tsfhvsdls`
// v1.9
// - Add `offset-ds` (offset with _d_elta a _s_hape)

module togmod1_domodule(mod) {
	assert(is_list(mod));
	assert(len(mod) > 0);
	if( mod[0] == "polygon-vp" ) {
		// ["polygon-vp", vertexes, paths]
		polygon(points=mod[1], paths=mod[2]);
	} else if( mod[0] == "polyhedron-vf" ) {
		polyhedron(mod[1], faces=mod[2]);
	} else if( mod[0] == "scale" ) {
		assert(len(mod) == 3);
		scale(mod[1]) togmod1_domodule(mod[2]);
	} else if( mod[0] == "translate" ) {
		assert(len(mod) == 3);
		assert(is_list(mod[1]));
		for(c=mod[1]) assert(is_num(c), "translate component should be numeric");
		translate(mod[1]) togmod1_domodule(mod[2]);
	} else if( mod[0] == "rotate" ) {
		assert(len(mod) == 3);
		rotate(mod[1]) togmod1_domodule(mod[2]);
	} else if( mod[0] == "intersection" ) {
		intersection_for( i=[1:1:len(mod)-1] ) togmod1_domodule(mod[i]);
	} else if( mod[0] == "difference" ) {
		difference() {
			togmod1_domodule(mod[1]);
			for( i=[2:1:len(mod)-1] ) togmod1_domodule(mod[i]);
		}
	} else if( mod[0] == "union" ) {
		for( i=[1:1:len(mod)-1] ) togmod1_domodule(mod[i]);
	} else if( mod[0] == "hull" ) {
		hull() for( i=[1:1:len(mod)-1] ) togmod1_domodule(mod[i]);
	} else if( mod[0] == "offset-rs" ) {
		assert(len(mod) == 3);
		assert(is_num(mod[1]));
		assert(is_list(mod[2]));
		offset(mod[1]) togmod1_domodule(mod[2]);
	} else if( mod[0] == "linear-extrude-zs" ) {
		// ["linear-extrude-zs", [z0,z1], 2d_shape] // centered
		// ["linear-extrude-zs", height, 2d_shape]
		let( zrange = is_list(mod[1]) ? mod[1] : [-mod[1]/2, mod[1]/2] ) {
			translate([0,0,zrange[0]]) linear_extrude(zrange[1]-zrange[0]) togmod1_domodule(mod[2]);
		}
	} else if( mod[0] == "render" ) {
		render() togmod1_domodule(mod[1]);
	} else if( mod[0] == "minkowski" ) {
		minkowski() {
			togmod1_domodule(mod[1]);
			togmod1_domodule(mod[2]);
		}
	} else if( mod[0] == "x-debug" ) {
		# togmod1_domodule(mod[1]);
	} else if( mod[0] == "x-color" ) {
		color(mod[1]) togmod1_domodule(mod[2]);
	} else if( mod[0] == "text-tsfhvsdls" ) {
		text(text=mod[1], size=mod[2], font=mod[3], halign=mod[4], valign=mod[5], spacing=mod[6], direction=mod[7], language=mod[7], script=mod[8]);
	} else if( mod[0] == "offset-ds" ) {
		assert(is_num(mod[1]));
		assert(is_list(mod[2]));
		offset(delta=mod[1]) togmod1_domodule(mod[2]);
	} else {
		assert(false, str("Unrecognized shape: ", mod[0]));
	}
}
// file: ../lib/Flangify0.scad
// Flangify0.2
// 
// Attempt at more convenient
// representation of holes
// with counterbores, bevels, flanges, etc.
// 
// Maybe should just be a special mode of tphl1_make_z_cylinder
// 
// pointdat = ["zdopses", ["zdops", [z, d], op, ...], ...], similar to a rath
// op = ["round", radius], same as togpath1-rathnode's
// 
// v0.2:
// - flangify0_extrude_z:
//   - Add support for `togpath1-polyline` shapes
//   - Allow 'zds' as an alternative to 'zrs'
// - Some comments

use <../lib/TOGMod1.scad>
use <../lib/TOGMod1Constructors.scad>
use <../lib/TOGPath1.scad>
use <../lib/TOGPolyhedronLib1.scad>
use <../lib/TOGVecLib0.scad>

// r0 = the reference radius (zrs[*][1]) at which no offset should happen
function flangify0_extrude_rath(zrs, rath, r0=0) =
	tphl1_make_polyhedron_from_layer_function(zrs,
		function(zr)
			let( offset_rath = togpath1_offset_rath(rath, zr[1]-r0) )
			togpath1_rath_to_polypoints(offset_rath),
		layer_points_transform = "key0-to-z"
	);

/**
 * Extrude the given shape along zrs.
 * You might want to use flangify0_spec_to_zrs to generate the zrs,
 * since that's what adds the flanges.
 *
 * r0 = the reference zr[1] that should not be offset.
 */
function flangify0_extrude_z(zrs, shape="point", r0=0, zds=undef) =
	assert( is_undef(zrs) ||  is_undef(zds), "Exactly one of zrs or zds should be specified")
	let( _zrs =
		!is_undef(zrs) ? zrs :
		!is_undef(zds) ? [for(zd=zds) [zd[0],zd[1]/2]] :
		assert(false, "Either zrs or zds must be specified")
	)
	shape == "point" ? flangify0_extrude_rath(_zrs, togpath1_make_circle_rath(1), r0+1) :
	is_list(shape) && shape[0] == "togpath1-rath" ? flangify0_extrude_rath(_zrs, shape, r0) :
	is_list(shape) && shape[0] == "togpath1-polyline" ? flangify0_extrude_rath(_zrs, togpath1_polyline_to_rath(shape, r=1, end_shape="round"), r0+1) :
	assert(false, str("Unsupported shape: ", shape));

function flangify0__spec_to_zrs1(zropses, idx=1, rfac=1) =
	let(rath = ["togpath1-rath",
		for(p=[idx:1:len(zropses)-1])
			let(zrops=zropses[p])
				let(zd=zrops[1])
					["togpath1-rathnode", [zd[0], zd[1]*rfac], for(o=[2:1:len(zrops)-1]) zrops[o]]
	])
	togpath1_rath_to_polypoints(rath);

/**
 * Extend a zdopses or zdrses down by extra_depth and up by extra_height
 * 
 * flangify0_extend(ED, EH, [["zdops", [A,B]], ["zdops", [C,D]]])
 * -> ["zdopses", ["zdops", [A-ED,B]], ["zdops", [A,B]], ["zdops", [C,D]], ["zdops", [C+EH,D]]]
 * 
 * Uh, does this work with zropses???
 */
function flangify0_extend(extra_depth, extra_height, spec) =
let(last = len(spec)-1)
// let(rfac = spec[0] == "zdopses" ? 0.5 : 1)
let(zd0 = spec[1   ])
let(zdN = spec[last])
[spec[0],
	if( extra_depth > 0 ) each [
//		["zdops", [zd0[1][0] - extra_depth - zd0[1]*rfac, 0.1    ]],
		[zd0[0], [zd0[1][0] - extra_depth              , zd0[1][1]]],
	],
	for( i=[1:1:len(spec)-1] ) spec[i],
	if( extra_height > 0 ) each [
		[zdN[0], [zdN[1][0] + extra_height              , zdN[1][1]]],
//		["zdops", [zdN[1][0] + extra_height + zdN[1]*rfac, 0.1    ]]
	],
];

function flangify0_spec_to_zrs(spec) =
	spec[0] == "zdopses" ? flangify0__spec_to_zrs1(spec, 1, 0.5) :
	spec[0] == "zropses" ? flangify0__spec_to_zrs1(spec, 1, 1) :
	assert(false, str("Unrecognized shape spec: '", spec[0], "'"));
// main file
use <../lib/Flangify0.scad>
use <../lib/TOGMod1.scad>

assert(
	flangify0_extend(10,20,["zdopses",
		["zdops", [-10,10]],
		["zdops", [-10,5 ], ["round", 3]],
		["zdops", [ 10,5 ], ["bevel", 3]],
		["zdops", [ 10,10]],
	]) == ["zdopses",
		["zdops", [-20,10]],
		["zdops", [-10,10]],
		["zdops", [-10,5 ], ["round", 3]],
		["zdops", [ 10,5 ], ["bevel", 3]],
		["zdops", [ 10,10]],
		["zdops", [ 30,10]],
	]
);

assert(
	flangify0_extend(10,20,["zropses",
		["zrops", [-10,10]],
		["zrops", [-10,5 ], ["round", 3]],
		["zrops", [ 10,5 ], ["bevel", 3]],
		["zrops", [ 10,10]],
	]) == ["zropses",
		["zrops", [-20,10]],
		["zrops", [-10,10]],
		["zrops", [-10,5 ], ["round", 3]],
		["zrops", [ 10,5 ], ["bevel", 3]],
		["zrops", [ 10,10]],
		["zrops", [ 30,10]],
	]
);

// togmod1_domodule(zrs_to_cylinder([[0,5],[10,5]]));
togmod1_domodule(flangify0_extrude_z(flangify0_spec_to_zrs(flangify0_extend(10, 10, ["zdopses",
	["zdops", [-10,20]],
	["zdops", [- 5,20]],
	["zdops", [- 5,10], ["round", 3]],
	["zdops", [  5,10], ["bevel", 3]],
	["zdops", [  5,20]],
	["zdops", [ 10,20]],
]))), $fn = 24);

translate([40,0,0])
togmod1_domodule(flangify0_extrude_z(flangify0_spec_to_zrs(flangify0_extend(10, 10, ["zropses",
	["zrops", [-10,20]],
	["zrops", [- 5,20]],
	["zrops", [- 5,10], ["round", 3]],
	["zrops", [  5,10], ["bevel", 3]],
	["zrops", [  5,20]],
	["zrops", [ 10,20]],
]))), $fn = 24);
